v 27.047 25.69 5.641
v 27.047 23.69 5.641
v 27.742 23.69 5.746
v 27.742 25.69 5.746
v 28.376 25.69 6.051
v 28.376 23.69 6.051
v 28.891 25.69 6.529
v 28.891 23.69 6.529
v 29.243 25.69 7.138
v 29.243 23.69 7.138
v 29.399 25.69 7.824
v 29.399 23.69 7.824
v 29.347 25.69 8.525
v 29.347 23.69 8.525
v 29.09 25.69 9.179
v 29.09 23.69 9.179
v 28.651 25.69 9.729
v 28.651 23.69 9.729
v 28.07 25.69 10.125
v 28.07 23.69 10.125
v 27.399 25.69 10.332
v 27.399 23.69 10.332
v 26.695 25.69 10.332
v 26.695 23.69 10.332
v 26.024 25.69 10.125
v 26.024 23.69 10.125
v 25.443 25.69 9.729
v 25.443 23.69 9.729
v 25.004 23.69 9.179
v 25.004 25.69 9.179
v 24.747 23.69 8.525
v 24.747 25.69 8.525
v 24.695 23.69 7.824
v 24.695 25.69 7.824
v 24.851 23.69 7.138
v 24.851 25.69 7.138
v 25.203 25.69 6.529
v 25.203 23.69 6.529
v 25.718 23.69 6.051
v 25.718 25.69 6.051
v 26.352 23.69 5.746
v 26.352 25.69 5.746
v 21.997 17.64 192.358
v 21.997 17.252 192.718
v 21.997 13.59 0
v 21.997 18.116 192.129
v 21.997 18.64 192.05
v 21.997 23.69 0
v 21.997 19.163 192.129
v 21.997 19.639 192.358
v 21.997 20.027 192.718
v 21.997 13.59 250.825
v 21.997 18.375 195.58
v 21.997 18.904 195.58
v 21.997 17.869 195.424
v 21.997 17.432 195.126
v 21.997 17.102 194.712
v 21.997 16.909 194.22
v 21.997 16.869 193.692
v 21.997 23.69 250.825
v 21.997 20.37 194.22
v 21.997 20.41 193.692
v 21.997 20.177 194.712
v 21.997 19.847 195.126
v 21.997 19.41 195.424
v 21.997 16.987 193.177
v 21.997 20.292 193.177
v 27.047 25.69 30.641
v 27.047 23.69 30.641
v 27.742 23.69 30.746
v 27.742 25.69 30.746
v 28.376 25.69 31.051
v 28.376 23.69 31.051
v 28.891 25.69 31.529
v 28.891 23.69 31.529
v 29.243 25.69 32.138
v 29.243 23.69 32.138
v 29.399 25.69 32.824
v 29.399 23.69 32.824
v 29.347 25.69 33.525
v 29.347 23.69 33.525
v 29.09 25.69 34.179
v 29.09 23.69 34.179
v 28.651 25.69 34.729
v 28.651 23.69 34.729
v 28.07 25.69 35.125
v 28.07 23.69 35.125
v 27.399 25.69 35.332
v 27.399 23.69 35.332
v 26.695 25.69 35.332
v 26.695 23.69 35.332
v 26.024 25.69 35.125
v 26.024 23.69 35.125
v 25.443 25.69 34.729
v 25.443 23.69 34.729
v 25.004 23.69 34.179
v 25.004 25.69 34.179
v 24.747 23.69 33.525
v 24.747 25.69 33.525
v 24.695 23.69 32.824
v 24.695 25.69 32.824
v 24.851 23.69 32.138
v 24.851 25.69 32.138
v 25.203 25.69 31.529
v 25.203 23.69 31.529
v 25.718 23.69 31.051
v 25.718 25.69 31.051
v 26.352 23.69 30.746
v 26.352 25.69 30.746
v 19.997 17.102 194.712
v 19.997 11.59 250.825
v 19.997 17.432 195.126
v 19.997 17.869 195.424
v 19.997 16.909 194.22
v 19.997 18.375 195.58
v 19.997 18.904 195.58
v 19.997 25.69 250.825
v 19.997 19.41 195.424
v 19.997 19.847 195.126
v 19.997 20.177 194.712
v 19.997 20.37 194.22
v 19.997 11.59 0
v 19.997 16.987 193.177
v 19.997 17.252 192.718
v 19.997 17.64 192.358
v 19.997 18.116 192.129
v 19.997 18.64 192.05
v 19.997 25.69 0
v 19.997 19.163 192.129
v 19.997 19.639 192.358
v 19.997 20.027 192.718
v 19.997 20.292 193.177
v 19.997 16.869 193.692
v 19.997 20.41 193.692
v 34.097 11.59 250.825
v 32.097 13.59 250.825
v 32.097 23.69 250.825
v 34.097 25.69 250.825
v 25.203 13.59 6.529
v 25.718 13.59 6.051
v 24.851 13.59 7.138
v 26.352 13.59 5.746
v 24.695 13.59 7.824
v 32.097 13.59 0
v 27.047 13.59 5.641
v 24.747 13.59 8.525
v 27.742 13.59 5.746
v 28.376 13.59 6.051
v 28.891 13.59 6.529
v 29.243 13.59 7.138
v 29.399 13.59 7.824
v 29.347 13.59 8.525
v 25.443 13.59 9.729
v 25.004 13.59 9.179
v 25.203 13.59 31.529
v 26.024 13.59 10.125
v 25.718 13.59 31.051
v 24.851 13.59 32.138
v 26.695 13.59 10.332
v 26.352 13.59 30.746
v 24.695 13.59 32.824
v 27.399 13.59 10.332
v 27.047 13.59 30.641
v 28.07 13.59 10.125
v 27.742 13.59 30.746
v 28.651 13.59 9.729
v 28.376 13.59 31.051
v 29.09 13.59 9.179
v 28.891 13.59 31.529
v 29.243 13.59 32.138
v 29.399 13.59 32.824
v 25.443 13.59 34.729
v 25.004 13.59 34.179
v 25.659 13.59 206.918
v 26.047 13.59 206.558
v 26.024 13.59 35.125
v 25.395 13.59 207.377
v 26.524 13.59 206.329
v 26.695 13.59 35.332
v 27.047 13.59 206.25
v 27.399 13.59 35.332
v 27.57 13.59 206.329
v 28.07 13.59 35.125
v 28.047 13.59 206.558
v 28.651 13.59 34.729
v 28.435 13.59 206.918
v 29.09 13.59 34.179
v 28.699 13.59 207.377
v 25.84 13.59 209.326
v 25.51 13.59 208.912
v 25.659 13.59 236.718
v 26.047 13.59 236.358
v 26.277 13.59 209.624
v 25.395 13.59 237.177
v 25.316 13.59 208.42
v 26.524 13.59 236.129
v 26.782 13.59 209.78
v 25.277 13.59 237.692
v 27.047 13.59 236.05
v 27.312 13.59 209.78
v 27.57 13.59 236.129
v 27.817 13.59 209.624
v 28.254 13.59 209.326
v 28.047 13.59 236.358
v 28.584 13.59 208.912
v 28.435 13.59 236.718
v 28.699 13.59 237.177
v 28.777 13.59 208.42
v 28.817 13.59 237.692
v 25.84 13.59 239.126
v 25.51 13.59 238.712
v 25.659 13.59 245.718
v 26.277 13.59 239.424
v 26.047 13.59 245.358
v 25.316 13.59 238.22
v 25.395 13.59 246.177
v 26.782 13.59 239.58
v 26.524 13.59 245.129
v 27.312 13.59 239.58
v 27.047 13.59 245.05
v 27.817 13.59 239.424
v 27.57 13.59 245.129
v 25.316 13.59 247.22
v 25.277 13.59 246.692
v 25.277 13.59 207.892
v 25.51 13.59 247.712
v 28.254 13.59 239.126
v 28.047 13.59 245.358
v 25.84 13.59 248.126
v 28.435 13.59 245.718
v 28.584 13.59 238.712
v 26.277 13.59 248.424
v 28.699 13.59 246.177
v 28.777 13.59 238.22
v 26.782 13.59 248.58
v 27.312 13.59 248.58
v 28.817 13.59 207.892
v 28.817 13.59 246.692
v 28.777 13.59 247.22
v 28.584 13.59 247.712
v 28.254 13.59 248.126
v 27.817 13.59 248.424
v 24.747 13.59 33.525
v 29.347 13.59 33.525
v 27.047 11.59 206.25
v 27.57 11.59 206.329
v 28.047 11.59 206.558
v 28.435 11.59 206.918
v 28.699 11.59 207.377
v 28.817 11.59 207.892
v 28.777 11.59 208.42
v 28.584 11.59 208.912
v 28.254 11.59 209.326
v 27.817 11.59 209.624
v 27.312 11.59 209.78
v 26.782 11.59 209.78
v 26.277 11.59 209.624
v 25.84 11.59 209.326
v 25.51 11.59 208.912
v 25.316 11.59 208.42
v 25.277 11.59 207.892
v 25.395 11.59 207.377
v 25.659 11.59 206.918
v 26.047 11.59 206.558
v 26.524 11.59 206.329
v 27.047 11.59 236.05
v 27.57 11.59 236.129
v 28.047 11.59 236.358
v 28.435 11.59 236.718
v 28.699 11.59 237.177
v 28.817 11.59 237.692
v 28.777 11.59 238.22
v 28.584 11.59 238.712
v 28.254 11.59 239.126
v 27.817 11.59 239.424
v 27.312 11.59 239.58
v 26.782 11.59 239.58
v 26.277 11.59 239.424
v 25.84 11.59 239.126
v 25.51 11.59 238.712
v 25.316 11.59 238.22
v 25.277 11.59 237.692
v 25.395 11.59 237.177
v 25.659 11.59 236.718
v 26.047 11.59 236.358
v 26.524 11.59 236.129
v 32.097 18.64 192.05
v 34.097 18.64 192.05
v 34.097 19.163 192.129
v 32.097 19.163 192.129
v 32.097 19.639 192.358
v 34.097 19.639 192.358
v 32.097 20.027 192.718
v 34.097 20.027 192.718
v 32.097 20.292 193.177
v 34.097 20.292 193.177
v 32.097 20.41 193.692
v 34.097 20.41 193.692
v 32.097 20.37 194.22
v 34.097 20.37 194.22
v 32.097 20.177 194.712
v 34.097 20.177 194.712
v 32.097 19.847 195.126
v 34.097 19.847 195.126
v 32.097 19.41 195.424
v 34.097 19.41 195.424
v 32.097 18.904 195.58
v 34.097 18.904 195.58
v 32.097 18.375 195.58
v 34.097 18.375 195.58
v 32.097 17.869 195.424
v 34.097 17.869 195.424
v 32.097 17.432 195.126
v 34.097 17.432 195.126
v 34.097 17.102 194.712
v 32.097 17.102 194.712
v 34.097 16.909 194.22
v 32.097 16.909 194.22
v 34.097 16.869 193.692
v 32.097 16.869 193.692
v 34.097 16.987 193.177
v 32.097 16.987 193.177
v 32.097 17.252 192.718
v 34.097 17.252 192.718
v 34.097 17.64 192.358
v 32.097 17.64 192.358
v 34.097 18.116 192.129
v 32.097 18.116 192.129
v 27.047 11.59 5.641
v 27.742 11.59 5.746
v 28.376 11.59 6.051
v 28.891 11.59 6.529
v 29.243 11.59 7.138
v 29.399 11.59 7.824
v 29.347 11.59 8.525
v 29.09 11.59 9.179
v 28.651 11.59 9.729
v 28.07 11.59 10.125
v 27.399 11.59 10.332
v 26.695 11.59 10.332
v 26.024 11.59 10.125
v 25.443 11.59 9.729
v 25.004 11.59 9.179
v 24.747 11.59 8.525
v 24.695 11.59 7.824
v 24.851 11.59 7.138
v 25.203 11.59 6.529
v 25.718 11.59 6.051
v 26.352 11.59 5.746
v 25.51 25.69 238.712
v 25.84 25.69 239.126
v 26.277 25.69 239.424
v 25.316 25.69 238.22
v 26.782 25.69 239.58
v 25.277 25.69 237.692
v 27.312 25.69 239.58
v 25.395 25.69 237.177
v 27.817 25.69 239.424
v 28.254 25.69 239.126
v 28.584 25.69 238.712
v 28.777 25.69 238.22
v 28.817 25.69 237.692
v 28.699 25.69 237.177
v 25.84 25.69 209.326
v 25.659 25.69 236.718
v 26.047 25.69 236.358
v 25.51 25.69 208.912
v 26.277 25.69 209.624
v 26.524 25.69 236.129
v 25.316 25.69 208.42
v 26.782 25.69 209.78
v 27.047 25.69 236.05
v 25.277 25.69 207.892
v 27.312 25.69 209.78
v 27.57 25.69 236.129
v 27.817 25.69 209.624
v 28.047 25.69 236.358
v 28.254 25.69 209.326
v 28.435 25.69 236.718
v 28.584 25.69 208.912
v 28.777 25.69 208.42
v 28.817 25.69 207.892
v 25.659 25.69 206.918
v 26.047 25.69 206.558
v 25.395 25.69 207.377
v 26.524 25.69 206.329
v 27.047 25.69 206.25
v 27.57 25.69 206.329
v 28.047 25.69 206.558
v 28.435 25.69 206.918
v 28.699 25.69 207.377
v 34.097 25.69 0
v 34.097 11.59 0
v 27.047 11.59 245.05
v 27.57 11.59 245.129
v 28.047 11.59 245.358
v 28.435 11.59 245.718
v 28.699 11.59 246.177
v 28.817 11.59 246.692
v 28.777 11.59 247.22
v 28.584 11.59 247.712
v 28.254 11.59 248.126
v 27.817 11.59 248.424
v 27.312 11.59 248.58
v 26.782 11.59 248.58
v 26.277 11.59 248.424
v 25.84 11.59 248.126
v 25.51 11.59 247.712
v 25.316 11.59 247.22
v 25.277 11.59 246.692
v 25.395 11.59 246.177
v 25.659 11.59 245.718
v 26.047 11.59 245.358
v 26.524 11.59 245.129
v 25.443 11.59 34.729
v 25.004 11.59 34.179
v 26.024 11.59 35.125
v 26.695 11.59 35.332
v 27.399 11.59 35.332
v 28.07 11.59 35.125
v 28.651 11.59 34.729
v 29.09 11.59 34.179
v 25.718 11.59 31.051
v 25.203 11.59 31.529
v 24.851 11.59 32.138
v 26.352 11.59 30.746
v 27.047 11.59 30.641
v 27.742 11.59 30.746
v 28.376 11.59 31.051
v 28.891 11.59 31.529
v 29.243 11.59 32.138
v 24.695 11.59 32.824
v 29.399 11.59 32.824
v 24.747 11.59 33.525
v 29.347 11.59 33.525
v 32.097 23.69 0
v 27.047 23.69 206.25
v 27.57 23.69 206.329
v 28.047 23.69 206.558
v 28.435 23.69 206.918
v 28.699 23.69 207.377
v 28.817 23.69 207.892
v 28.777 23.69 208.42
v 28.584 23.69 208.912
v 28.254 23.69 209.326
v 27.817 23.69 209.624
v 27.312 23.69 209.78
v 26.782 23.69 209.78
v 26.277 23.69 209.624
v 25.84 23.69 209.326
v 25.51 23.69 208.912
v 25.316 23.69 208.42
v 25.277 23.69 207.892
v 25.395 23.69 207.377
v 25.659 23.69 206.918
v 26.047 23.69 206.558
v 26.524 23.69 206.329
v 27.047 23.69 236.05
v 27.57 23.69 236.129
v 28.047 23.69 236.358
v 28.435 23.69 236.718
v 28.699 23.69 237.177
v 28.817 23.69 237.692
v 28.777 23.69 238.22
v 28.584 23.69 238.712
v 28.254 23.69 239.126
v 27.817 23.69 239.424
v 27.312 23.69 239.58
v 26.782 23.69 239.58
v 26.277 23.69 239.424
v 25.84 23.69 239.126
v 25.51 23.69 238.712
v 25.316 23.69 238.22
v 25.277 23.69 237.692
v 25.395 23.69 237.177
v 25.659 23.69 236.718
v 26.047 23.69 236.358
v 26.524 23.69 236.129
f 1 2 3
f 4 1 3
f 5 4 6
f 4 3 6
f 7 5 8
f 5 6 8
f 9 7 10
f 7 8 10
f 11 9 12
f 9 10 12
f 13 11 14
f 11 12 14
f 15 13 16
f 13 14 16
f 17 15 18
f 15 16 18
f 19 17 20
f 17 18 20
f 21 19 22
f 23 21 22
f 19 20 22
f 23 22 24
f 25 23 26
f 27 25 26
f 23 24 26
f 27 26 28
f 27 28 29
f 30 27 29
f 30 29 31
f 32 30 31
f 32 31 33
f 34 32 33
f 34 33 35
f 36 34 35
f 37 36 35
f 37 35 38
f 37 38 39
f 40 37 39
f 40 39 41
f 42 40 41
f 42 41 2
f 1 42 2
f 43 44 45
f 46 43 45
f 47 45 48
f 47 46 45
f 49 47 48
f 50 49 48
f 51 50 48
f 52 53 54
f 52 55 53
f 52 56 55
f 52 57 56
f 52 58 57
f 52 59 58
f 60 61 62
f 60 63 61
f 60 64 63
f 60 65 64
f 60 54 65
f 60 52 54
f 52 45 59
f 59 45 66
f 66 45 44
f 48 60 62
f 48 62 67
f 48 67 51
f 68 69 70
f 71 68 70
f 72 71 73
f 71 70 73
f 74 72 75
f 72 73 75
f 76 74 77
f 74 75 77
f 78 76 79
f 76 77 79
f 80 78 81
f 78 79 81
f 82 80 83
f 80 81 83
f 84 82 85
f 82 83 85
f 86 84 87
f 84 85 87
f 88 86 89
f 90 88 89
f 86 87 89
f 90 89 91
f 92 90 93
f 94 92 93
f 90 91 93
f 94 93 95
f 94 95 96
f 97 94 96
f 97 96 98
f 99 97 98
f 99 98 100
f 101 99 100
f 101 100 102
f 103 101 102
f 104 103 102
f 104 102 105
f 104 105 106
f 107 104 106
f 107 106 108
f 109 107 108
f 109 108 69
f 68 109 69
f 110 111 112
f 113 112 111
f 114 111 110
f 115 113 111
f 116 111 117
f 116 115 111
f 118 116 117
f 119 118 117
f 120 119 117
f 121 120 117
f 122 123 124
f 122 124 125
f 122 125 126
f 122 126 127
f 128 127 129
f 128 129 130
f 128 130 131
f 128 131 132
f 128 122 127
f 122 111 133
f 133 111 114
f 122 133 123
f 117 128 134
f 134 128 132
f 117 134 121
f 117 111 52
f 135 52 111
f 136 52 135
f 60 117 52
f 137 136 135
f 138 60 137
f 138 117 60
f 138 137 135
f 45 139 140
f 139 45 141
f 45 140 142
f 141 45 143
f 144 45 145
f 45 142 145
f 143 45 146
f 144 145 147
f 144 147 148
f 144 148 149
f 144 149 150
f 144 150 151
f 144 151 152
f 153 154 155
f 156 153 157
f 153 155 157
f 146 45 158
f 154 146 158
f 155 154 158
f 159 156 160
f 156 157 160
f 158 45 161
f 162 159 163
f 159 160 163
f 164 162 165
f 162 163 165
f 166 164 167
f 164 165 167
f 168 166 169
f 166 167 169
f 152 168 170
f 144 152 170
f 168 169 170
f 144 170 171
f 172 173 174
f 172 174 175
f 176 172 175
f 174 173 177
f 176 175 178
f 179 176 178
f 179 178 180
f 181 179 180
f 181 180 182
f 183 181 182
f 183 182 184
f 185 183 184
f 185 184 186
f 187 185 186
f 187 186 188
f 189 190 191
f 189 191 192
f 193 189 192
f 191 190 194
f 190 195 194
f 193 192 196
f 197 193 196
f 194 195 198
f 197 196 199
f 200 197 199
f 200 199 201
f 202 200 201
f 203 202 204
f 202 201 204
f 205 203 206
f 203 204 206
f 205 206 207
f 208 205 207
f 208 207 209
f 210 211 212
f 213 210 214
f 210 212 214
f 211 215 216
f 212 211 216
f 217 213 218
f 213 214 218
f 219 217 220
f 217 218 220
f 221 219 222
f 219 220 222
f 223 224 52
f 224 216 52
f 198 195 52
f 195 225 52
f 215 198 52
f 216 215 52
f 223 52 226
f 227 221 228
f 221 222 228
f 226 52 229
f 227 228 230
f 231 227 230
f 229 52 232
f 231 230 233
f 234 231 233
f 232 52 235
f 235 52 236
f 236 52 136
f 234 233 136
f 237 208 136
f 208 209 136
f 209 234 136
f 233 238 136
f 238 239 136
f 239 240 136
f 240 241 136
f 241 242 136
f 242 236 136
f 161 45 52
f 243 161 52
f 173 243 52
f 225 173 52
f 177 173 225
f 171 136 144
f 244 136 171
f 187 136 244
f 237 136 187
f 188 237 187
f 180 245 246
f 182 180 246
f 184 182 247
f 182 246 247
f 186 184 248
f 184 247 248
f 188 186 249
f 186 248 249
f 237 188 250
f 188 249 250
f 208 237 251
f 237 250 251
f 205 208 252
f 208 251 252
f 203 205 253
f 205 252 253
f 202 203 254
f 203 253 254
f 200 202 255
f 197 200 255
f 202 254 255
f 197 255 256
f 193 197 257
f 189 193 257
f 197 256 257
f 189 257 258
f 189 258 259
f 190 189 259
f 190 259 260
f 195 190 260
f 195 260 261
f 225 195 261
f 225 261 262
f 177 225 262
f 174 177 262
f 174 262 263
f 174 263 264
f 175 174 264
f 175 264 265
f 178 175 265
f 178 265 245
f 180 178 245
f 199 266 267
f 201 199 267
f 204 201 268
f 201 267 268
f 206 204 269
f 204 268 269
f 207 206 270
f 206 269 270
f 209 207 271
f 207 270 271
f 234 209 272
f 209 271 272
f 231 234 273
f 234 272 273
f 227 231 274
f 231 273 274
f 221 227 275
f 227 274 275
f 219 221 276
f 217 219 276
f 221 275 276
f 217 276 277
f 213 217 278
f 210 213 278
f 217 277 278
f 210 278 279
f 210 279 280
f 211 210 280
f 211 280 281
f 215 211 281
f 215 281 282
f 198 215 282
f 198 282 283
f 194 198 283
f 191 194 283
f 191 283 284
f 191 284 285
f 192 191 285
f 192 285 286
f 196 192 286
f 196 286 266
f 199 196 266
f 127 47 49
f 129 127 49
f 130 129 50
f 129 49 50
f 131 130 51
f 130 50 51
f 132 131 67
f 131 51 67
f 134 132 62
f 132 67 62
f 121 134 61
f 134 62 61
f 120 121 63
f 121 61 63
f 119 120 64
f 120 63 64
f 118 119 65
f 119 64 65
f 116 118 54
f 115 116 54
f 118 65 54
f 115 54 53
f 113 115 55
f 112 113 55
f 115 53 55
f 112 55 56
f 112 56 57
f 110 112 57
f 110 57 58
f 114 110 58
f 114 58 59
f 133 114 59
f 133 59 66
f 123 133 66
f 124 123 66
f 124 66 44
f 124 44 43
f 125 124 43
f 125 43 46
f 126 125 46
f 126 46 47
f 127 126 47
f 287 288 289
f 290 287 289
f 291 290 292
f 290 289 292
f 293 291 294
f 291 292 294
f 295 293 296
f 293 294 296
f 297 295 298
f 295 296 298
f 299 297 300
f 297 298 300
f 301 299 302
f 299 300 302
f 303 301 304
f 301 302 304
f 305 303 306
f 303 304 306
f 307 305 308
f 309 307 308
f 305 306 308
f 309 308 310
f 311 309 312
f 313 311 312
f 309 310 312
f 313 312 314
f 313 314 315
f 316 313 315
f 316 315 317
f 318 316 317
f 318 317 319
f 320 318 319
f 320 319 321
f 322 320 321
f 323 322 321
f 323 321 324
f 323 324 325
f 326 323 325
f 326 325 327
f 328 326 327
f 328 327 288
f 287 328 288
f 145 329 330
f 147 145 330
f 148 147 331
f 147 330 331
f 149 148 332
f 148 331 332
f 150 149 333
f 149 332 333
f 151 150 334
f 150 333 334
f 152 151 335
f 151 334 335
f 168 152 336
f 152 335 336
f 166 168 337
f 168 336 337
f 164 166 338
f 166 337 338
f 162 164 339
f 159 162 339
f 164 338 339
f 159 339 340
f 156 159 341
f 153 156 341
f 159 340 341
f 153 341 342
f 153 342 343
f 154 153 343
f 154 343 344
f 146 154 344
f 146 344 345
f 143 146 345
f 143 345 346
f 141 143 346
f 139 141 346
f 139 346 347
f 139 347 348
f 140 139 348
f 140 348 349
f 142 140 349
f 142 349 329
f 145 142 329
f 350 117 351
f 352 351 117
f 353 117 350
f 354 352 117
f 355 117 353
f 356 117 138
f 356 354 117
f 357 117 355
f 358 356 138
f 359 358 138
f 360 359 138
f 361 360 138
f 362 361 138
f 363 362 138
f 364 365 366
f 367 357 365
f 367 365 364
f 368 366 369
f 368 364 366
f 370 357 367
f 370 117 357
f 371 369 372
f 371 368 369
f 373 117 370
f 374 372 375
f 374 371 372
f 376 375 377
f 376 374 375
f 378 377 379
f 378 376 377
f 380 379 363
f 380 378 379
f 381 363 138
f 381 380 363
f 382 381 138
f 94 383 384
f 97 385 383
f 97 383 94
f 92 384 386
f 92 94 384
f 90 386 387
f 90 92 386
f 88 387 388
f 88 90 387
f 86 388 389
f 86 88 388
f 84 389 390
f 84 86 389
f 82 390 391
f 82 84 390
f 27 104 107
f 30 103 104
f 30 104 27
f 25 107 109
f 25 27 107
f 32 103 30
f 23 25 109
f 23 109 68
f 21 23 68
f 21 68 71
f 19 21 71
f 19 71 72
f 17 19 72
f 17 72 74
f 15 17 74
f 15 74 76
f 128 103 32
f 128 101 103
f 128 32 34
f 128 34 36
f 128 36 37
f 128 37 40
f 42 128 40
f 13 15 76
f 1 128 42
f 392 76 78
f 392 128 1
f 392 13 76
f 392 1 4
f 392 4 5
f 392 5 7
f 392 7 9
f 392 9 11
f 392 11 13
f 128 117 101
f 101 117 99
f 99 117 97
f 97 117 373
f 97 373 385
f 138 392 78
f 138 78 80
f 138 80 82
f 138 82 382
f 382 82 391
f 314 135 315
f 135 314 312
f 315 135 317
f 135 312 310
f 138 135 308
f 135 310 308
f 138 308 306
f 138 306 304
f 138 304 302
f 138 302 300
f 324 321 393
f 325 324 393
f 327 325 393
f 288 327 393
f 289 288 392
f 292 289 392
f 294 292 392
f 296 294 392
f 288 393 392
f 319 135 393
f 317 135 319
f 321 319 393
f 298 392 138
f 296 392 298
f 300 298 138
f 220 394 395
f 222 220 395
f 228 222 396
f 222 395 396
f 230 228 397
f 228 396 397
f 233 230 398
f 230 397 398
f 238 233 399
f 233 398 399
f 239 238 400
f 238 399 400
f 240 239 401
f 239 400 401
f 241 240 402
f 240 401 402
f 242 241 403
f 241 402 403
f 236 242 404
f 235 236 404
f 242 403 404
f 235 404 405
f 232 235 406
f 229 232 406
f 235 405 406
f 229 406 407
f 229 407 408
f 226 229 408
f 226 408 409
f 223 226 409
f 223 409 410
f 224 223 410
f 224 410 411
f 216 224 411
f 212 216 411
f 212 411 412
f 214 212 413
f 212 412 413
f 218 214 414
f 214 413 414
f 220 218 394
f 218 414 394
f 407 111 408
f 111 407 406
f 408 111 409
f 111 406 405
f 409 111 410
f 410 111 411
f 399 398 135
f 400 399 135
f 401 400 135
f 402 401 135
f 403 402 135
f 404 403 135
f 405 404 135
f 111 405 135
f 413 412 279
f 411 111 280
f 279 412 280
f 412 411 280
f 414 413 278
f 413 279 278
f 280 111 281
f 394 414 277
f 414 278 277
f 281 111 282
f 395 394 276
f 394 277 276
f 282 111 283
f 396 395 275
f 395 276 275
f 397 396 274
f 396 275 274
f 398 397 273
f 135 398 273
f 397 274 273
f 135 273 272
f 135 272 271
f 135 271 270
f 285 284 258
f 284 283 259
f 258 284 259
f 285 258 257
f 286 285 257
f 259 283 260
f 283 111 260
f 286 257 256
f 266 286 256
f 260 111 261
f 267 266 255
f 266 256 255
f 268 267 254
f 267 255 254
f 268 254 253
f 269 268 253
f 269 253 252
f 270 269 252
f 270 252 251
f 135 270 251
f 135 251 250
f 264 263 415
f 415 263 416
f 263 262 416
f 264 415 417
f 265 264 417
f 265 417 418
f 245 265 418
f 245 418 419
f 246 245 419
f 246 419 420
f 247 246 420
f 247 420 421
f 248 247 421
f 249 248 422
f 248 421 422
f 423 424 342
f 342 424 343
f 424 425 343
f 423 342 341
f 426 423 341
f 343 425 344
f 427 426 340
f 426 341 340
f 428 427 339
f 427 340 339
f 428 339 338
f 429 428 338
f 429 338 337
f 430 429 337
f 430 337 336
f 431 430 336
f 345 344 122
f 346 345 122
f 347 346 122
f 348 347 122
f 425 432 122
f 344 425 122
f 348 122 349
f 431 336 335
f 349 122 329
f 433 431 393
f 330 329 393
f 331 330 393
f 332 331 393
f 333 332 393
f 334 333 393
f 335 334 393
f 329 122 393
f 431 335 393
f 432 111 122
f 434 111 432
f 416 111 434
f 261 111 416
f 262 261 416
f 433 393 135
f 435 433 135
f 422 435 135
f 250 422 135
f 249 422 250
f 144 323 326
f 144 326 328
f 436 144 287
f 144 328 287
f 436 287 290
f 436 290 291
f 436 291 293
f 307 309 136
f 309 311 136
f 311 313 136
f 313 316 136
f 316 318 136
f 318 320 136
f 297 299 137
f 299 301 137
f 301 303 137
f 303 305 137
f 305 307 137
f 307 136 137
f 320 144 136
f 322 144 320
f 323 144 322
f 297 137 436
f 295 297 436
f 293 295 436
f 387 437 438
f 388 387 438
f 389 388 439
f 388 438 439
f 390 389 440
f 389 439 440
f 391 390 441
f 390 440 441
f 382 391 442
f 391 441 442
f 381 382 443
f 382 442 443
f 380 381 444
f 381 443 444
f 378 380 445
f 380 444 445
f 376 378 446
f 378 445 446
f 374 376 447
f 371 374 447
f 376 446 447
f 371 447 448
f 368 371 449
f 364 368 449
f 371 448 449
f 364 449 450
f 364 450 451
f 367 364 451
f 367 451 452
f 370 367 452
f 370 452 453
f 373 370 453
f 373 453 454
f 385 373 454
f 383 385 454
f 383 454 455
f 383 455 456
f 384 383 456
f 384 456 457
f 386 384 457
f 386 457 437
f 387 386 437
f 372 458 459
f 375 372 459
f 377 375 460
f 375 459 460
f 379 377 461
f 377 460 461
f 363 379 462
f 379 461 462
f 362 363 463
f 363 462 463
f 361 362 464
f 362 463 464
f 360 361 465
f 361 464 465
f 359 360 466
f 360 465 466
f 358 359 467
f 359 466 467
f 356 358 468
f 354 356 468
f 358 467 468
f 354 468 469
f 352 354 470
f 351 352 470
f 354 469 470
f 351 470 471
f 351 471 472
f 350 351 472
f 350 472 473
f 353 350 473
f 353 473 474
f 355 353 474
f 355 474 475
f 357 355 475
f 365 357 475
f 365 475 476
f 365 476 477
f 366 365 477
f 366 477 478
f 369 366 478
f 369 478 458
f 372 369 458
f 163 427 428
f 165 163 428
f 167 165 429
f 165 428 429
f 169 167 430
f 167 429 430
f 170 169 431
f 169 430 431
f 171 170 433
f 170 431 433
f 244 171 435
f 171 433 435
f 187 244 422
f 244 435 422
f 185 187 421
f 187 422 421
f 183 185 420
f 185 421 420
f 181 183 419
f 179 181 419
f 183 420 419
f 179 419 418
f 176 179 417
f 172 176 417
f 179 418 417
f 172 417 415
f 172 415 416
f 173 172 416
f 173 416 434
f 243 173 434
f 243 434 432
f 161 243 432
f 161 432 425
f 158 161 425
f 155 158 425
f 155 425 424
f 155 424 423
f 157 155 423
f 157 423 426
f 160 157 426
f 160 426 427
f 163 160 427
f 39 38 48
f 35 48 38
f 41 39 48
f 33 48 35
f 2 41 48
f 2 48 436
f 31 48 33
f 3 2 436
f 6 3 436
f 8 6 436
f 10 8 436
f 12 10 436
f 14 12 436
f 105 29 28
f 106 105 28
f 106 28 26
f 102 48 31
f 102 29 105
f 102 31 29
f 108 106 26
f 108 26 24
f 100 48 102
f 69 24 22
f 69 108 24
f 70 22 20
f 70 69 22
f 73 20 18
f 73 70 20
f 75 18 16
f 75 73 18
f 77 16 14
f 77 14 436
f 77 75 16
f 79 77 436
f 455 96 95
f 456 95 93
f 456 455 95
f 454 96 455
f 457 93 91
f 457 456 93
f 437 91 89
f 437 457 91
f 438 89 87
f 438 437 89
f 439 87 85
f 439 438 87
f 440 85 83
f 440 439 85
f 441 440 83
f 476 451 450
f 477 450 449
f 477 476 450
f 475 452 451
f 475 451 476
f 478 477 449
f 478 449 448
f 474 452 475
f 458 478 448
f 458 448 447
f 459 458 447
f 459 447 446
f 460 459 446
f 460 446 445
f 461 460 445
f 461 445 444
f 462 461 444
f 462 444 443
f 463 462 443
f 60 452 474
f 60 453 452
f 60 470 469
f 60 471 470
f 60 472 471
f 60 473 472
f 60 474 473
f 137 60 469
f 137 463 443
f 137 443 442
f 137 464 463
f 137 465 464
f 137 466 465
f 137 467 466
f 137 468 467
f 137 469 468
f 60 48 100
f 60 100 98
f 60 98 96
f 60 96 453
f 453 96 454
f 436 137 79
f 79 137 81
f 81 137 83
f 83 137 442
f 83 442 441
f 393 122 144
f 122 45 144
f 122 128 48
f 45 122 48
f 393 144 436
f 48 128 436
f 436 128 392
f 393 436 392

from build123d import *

# Parameters (mm, degrees)
SKETCH1_W           = 14.1
SKETCH1_H           = 14.1
BOSS_EXTRUDE1_DEPTH = 250.825
SKETCH2_W           = 10.1
SKETCH2_H           = 10.1
CUT_EXTRUDE1_DEPTH  = 255.432185656
SKETCH3_R           = 1.775
SKETCH3_R_2         = 2.358740524
CUT_EXTRUDE2_DEPTH  = 254.524349476
SKETCH4_R           = 1.775
CUT_EXTRUDE3_DEPTH  = 2
SKETCH5_R           = 1.775
CUT_EXTRUDE4_DEPTH  = 253.531071247


with BuildPart() as part:
    # Sketch1 → Boss-Extrude1 (new body)
    with BuildSketch(Plane.XY):
        with Locations((27.046996237, 18.639517713)):
            Rectangle(SKETCH1_W, SKETCH1_H)
    extrude(amount=BOSS_EXTRUDE1_DEPTH)

    # Sketch2 → Cut-Extrude1 (cut, through all)
    with BuildSketch(Plane.XY.offset(250.825)):
        with Locations((27.046996237, 18.639517713)):
            Rectangle(SKETCH2_W, SKETCH2_H)
    extrude(amount=-CUT_EXTRUDE1_DEPTH, mode=Mode.SUBTRACT)

    # Sketch3 → Cut-Extrude2 (cut, through all)
    with BuildSketch(Plane.XZ.offset(-11.589517713)):
        with Locations(Location((27.046996237, 237.825, 0), (0, 0, 270))):
            Circle(SKETCH3_R)
        with Locations(Location((27.046996237, 208.025, 0), (0, 0, 270))):
            Circle(SKETCH3_R)
        with Locations(Location((27.046996237, 8, 0), (0, 0, 270))):
            Circle(SKETCH3_R_2)
        with Locations(Location((27.046996237, 33, 0), (0, 0, 270))):
            Circle(SKETCH3_R_2)
    extrude(amount=-CUT_EXTRUDE2_DEPTH, mode=Mode.SUBTRACT)

    # Sketch4 → Cut-Extrude3 (cut)
    with BuildSketch(Plane.XZ.offset(-11.589517713)):
        with Locations(Location((27.046996237, 246.825, 0), (0, 0, 270))):
            Circle(SKETCH4_R)
    extrude(amount=-CUT_EXTRUDE3_DEPTH, mode=Mode.SUBTRACT)

    # Sketch5 → Cut-Extrude4 (cut, through all)
    with BuildSketch(Plane(origin=(34.096996237, 0, 0), x_dir=(0, 0, -1), z_dir=(1, 0, 0))):
        with Locations((-193.825, 18.639517713)):
            Circle(SKETCH5_R)
    extrude(amount=-CUT_EXTRUDE4_DEPTH, mode=Mode.SUBTRACT)


solid = part.part
